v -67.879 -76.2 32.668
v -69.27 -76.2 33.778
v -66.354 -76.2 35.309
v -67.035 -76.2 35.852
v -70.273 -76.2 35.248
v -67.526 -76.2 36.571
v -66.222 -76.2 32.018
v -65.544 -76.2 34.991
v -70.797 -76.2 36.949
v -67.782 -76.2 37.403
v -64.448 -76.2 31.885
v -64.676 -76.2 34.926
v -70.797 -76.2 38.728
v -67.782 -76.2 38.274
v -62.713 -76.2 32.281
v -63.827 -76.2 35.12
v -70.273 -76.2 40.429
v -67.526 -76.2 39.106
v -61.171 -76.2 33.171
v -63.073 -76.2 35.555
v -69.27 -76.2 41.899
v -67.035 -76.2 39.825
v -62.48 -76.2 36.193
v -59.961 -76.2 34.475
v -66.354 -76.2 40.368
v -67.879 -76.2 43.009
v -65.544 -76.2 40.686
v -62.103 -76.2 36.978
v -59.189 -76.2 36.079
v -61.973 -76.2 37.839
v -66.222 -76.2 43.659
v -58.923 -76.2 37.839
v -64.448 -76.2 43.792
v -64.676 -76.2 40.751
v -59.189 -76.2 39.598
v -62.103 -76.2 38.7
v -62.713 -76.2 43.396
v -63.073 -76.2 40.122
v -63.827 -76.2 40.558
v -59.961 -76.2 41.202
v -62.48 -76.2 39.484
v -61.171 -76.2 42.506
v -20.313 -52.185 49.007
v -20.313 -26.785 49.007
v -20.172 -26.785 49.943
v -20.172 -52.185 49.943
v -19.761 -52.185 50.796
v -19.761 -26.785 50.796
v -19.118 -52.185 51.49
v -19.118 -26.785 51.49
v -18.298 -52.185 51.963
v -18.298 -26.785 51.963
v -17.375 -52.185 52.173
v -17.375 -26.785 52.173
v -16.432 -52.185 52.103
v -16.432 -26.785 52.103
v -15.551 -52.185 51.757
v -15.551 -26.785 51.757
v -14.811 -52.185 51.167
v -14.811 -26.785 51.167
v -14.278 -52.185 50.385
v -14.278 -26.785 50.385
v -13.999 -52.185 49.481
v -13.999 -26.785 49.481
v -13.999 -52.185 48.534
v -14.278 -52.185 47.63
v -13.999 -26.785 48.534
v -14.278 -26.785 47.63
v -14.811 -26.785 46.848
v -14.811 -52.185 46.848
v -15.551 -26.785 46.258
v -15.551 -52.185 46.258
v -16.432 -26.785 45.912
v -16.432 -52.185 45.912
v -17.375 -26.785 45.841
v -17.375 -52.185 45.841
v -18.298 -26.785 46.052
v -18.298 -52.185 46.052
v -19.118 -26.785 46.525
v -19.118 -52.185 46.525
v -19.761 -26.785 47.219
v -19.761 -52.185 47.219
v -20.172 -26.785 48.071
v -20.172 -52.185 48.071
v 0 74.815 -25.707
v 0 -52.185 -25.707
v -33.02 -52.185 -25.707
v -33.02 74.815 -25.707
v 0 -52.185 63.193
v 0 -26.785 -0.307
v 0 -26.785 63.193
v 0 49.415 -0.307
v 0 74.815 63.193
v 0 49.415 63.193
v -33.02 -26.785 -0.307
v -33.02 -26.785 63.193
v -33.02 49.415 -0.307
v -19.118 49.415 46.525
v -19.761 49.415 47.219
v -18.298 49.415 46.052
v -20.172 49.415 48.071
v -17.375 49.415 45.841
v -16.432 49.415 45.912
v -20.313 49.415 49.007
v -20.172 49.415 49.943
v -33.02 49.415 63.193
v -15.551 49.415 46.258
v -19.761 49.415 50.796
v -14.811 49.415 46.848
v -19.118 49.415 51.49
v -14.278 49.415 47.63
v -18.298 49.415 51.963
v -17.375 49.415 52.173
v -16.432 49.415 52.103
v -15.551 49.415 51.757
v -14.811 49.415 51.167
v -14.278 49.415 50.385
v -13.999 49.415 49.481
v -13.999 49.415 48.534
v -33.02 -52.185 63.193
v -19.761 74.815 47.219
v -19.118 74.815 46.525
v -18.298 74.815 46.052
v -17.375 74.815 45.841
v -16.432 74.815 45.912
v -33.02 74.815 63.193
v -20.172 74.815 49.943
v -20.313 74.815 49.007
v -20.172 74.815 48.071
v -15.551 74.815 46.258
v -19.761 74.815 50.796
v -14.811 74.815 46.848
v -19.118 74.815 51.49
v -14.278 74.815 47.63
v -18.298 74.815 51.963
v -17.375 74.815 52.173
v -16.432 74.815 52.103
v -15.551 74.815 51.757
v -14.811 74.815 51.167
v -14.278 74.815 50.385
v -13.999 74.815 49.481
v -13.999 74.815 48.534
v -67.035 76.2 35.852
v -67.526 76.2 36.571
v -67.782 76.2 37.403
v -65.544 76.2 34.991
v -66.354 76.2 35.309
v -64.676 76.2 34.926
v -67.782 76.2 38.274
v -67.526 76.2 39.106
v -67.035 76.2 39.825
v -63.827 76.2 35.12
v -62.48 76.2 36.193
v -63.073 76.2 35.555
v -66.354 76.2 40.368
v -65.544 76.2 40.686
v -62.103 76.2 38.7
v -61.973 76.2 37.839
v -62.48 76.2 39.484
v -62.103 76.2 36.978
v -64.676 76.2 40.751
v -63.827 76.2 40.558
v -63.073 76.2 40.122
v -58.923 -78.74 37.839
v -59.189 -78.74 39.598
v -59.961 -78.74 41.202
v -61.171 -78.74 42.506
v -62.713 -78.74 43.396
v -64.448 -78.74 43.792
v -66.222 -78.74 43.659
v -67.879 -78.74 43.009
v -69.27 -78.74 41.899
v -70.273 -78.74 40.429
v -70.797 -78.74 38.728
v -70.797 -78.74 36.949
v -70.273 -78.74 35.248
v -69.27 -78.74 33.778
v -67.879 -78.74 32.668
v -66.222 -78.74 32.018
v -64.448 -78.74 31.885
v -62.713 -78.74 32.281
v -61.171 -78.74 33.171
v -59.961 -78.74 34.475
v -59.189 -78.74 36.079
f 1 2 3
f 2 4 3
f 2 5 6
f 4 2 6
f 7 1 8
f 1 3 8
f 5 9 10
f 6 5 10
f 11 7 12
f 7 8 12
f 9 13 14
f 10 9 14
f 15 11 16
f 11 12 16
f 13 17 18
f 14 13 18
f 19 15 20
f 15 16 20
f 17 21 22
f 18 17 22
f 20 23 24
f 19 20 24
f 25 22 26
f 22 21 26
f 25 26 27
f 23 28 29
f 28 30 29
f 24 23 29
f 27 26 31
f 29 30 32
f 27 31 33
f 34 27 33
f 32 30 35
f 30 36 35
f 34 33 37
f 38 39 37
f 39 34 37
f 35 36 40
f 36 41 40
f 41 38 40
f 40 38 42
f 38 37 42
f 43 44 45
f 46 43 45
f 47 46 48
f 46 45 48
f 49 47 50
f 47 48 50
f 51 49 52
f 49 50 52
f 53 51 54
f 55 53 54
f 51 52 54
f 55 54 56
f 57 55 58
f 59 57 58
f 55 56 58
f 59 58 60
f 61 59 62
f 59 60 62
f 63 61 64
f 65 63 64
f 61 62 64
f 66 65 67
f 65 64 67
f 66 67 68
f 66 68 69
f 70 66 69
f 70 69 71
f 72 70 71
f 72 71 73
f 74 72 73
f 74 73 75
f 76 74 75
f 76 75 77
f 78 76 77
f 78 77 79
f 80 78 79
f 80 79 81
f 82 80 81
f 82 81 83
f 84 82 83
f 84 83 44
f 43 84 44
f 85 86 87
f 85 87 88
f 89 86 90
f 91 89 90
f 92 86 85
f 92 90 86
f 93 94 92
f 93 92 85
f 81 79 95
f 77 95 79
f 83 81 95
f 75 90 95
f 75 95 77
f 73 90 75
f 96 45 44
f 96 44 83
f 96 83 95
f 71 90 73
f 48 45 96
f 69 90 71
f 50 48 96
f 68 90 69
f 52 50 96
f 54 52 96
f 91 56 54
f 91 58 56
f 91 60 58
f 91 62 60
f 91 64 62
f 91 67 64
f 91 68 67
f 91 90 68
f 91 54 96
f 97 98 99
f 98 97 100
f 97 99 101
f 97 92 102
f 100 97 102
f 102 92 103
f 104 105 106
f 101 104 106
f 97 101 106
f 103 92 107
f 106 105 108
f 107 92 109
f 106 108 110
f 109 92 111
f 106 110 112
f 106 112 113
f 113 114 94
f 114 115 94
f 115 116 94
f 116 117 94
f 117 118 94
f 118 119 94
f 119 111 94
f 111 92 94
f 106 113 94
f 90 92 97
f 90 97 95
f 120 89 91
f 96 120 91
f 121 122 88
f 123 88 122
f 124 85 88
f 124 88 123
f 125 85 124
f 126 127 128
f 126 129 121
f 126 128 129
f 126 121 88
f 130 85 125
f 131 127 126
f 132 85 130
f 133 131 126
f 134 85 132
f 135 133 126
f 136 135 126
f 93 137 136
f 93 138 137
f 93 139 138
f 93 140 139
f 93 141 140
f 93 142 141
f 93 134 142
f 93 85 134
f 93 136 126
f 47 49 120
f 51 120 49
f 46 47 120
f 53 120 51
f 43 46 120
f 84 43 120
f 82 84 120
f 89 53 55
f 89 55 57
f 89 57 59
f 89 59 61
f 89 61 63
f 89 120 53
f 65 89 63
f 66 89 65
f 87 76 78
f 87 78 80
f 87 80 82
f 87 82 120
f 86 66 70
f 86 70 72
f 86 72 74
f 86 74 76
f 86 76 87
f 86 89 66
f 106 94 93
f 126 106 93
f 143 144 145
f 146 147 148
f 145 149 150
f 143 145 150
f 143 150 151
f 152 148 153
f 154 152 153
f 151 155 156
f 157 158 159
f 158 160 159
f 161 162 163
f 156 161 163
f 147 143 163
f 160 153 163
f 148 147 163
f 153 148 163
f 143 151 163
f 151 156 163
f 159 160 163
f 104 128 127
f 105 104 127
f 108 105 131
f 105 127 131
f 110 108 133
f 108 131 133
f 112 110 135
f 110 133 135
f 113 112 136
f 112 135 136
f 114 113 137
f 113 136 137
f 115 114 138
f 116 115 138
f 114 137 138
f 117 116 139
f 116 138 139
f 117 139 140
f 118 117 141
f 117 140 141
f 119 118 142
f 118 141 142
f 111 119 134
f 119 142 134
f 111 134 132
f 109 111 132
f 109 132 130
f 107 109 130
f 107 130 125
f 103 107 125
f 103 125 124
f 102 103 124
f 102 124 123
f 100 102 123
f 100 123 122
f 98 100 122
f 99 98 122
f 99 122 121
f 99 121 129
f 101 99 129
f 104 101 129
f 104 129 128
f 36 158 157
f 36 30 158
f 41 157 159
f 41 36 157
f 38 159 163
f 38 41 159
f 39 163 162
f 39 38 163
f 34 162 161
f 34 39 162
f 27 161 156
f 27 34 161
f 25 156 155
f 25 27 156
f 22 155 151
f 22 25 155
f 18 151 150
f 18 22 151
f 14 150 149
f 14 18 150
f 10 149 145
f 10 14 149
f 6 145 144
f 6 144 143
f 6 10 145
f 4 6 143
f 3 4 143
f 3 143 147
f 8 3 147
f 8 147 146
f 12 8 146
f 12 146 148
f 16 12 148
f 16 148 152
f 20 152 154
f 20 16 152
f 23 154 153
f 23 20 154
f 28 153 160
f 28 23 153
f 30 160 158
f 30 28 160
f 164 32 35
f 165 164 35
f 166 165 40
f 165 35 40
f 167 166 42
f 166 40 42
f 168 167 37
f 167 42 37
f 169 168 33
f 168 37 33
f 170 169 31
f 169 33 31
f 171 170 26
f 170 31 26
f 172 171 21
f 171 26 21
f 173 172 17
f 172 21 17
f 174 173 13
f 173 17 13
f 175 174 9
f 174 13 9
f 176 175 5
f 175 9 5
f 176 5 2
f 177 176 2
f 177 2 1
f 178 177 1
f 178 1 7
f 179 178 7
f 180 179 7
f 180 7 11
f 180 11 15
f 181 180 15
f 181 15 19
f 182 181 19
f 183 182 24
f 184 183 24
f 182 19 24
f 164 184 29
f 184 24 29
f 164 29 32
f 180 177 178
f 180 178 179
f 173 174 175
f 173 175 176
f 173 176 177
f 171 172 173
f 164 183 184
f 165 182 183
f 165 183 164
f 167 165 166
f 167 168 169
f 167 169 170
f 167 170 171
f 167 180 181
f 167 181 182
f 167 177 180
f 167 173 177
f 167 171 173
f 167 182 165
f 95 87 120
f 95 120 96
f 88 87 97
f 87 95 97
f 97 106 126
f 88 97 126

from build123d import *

# Parameters (mm, degrees)
F0_W          = 25.4
F0_H          = 63.5
F1_DEPTH      = 33.02
F3_D          = 6.35
F4_R          = 2.921
F5_DEPTH      = 76.2
F5_DEPTH_BACK = 76.2
F6_R          = 5.970295
F6_R_2        = 2.921
F7_DEPTH      = 2.54


with BuildPart() as f1:
    # F0 (on Right) → F1 (new body)
    with BuildSketch(Plane.YZ):
        with Locations((-39.484619, 31.442815)):
            Rectangle(F0_W, F0_H)
        Polygon((-26.784619, -0.307185), (-52.184619, -0.307185), (-52.184619, -25.707185), (74.815381, -25.707185), (74.815381, -0.307185), (49.415381, -0.307185), align=None)
        with Locations((62.115381, 31.442815)):
            Rectangle(F0_W, F0_H)
    extrude(amount=-F1_DEPTH)

    # F3 (through all)
    with Locations(Plane.XZ.offset(52.184619)):
        with Locations((-17.138124, 49.00733)):
            Hole(F3_D / 2)


with BuildPart() as f5:
    # F4 (on Front) → F5 (new body, two sides)
    with BuildSketch(Plane.XZ) as f5_sk:
        with Locations((-64.89379, 37.838664)):
            Circle(F4_R)
    extrude(amount=F5_DEPTH)
    extrude(f5_sk.sketch, amount=-F5_DEPTH_BACK)

    # F6 (on face) → F7 (join)
    with BuildSketch(Plane.XZ.offset(76.2)):
        with Locations((-64.89379, 37.838664)):
            Circle(F6_R)
        with Locations((-64.89379, 37.838664)):
            Circle(F6_R_2, mode=Mode.SUBTRACT)
        with Locations((-64.89379, 37.838664)):
            Circle(F6_R_2)
    extrude(amount=F7_DEPTH)


solid = Compound([f1.part, f5.part])
